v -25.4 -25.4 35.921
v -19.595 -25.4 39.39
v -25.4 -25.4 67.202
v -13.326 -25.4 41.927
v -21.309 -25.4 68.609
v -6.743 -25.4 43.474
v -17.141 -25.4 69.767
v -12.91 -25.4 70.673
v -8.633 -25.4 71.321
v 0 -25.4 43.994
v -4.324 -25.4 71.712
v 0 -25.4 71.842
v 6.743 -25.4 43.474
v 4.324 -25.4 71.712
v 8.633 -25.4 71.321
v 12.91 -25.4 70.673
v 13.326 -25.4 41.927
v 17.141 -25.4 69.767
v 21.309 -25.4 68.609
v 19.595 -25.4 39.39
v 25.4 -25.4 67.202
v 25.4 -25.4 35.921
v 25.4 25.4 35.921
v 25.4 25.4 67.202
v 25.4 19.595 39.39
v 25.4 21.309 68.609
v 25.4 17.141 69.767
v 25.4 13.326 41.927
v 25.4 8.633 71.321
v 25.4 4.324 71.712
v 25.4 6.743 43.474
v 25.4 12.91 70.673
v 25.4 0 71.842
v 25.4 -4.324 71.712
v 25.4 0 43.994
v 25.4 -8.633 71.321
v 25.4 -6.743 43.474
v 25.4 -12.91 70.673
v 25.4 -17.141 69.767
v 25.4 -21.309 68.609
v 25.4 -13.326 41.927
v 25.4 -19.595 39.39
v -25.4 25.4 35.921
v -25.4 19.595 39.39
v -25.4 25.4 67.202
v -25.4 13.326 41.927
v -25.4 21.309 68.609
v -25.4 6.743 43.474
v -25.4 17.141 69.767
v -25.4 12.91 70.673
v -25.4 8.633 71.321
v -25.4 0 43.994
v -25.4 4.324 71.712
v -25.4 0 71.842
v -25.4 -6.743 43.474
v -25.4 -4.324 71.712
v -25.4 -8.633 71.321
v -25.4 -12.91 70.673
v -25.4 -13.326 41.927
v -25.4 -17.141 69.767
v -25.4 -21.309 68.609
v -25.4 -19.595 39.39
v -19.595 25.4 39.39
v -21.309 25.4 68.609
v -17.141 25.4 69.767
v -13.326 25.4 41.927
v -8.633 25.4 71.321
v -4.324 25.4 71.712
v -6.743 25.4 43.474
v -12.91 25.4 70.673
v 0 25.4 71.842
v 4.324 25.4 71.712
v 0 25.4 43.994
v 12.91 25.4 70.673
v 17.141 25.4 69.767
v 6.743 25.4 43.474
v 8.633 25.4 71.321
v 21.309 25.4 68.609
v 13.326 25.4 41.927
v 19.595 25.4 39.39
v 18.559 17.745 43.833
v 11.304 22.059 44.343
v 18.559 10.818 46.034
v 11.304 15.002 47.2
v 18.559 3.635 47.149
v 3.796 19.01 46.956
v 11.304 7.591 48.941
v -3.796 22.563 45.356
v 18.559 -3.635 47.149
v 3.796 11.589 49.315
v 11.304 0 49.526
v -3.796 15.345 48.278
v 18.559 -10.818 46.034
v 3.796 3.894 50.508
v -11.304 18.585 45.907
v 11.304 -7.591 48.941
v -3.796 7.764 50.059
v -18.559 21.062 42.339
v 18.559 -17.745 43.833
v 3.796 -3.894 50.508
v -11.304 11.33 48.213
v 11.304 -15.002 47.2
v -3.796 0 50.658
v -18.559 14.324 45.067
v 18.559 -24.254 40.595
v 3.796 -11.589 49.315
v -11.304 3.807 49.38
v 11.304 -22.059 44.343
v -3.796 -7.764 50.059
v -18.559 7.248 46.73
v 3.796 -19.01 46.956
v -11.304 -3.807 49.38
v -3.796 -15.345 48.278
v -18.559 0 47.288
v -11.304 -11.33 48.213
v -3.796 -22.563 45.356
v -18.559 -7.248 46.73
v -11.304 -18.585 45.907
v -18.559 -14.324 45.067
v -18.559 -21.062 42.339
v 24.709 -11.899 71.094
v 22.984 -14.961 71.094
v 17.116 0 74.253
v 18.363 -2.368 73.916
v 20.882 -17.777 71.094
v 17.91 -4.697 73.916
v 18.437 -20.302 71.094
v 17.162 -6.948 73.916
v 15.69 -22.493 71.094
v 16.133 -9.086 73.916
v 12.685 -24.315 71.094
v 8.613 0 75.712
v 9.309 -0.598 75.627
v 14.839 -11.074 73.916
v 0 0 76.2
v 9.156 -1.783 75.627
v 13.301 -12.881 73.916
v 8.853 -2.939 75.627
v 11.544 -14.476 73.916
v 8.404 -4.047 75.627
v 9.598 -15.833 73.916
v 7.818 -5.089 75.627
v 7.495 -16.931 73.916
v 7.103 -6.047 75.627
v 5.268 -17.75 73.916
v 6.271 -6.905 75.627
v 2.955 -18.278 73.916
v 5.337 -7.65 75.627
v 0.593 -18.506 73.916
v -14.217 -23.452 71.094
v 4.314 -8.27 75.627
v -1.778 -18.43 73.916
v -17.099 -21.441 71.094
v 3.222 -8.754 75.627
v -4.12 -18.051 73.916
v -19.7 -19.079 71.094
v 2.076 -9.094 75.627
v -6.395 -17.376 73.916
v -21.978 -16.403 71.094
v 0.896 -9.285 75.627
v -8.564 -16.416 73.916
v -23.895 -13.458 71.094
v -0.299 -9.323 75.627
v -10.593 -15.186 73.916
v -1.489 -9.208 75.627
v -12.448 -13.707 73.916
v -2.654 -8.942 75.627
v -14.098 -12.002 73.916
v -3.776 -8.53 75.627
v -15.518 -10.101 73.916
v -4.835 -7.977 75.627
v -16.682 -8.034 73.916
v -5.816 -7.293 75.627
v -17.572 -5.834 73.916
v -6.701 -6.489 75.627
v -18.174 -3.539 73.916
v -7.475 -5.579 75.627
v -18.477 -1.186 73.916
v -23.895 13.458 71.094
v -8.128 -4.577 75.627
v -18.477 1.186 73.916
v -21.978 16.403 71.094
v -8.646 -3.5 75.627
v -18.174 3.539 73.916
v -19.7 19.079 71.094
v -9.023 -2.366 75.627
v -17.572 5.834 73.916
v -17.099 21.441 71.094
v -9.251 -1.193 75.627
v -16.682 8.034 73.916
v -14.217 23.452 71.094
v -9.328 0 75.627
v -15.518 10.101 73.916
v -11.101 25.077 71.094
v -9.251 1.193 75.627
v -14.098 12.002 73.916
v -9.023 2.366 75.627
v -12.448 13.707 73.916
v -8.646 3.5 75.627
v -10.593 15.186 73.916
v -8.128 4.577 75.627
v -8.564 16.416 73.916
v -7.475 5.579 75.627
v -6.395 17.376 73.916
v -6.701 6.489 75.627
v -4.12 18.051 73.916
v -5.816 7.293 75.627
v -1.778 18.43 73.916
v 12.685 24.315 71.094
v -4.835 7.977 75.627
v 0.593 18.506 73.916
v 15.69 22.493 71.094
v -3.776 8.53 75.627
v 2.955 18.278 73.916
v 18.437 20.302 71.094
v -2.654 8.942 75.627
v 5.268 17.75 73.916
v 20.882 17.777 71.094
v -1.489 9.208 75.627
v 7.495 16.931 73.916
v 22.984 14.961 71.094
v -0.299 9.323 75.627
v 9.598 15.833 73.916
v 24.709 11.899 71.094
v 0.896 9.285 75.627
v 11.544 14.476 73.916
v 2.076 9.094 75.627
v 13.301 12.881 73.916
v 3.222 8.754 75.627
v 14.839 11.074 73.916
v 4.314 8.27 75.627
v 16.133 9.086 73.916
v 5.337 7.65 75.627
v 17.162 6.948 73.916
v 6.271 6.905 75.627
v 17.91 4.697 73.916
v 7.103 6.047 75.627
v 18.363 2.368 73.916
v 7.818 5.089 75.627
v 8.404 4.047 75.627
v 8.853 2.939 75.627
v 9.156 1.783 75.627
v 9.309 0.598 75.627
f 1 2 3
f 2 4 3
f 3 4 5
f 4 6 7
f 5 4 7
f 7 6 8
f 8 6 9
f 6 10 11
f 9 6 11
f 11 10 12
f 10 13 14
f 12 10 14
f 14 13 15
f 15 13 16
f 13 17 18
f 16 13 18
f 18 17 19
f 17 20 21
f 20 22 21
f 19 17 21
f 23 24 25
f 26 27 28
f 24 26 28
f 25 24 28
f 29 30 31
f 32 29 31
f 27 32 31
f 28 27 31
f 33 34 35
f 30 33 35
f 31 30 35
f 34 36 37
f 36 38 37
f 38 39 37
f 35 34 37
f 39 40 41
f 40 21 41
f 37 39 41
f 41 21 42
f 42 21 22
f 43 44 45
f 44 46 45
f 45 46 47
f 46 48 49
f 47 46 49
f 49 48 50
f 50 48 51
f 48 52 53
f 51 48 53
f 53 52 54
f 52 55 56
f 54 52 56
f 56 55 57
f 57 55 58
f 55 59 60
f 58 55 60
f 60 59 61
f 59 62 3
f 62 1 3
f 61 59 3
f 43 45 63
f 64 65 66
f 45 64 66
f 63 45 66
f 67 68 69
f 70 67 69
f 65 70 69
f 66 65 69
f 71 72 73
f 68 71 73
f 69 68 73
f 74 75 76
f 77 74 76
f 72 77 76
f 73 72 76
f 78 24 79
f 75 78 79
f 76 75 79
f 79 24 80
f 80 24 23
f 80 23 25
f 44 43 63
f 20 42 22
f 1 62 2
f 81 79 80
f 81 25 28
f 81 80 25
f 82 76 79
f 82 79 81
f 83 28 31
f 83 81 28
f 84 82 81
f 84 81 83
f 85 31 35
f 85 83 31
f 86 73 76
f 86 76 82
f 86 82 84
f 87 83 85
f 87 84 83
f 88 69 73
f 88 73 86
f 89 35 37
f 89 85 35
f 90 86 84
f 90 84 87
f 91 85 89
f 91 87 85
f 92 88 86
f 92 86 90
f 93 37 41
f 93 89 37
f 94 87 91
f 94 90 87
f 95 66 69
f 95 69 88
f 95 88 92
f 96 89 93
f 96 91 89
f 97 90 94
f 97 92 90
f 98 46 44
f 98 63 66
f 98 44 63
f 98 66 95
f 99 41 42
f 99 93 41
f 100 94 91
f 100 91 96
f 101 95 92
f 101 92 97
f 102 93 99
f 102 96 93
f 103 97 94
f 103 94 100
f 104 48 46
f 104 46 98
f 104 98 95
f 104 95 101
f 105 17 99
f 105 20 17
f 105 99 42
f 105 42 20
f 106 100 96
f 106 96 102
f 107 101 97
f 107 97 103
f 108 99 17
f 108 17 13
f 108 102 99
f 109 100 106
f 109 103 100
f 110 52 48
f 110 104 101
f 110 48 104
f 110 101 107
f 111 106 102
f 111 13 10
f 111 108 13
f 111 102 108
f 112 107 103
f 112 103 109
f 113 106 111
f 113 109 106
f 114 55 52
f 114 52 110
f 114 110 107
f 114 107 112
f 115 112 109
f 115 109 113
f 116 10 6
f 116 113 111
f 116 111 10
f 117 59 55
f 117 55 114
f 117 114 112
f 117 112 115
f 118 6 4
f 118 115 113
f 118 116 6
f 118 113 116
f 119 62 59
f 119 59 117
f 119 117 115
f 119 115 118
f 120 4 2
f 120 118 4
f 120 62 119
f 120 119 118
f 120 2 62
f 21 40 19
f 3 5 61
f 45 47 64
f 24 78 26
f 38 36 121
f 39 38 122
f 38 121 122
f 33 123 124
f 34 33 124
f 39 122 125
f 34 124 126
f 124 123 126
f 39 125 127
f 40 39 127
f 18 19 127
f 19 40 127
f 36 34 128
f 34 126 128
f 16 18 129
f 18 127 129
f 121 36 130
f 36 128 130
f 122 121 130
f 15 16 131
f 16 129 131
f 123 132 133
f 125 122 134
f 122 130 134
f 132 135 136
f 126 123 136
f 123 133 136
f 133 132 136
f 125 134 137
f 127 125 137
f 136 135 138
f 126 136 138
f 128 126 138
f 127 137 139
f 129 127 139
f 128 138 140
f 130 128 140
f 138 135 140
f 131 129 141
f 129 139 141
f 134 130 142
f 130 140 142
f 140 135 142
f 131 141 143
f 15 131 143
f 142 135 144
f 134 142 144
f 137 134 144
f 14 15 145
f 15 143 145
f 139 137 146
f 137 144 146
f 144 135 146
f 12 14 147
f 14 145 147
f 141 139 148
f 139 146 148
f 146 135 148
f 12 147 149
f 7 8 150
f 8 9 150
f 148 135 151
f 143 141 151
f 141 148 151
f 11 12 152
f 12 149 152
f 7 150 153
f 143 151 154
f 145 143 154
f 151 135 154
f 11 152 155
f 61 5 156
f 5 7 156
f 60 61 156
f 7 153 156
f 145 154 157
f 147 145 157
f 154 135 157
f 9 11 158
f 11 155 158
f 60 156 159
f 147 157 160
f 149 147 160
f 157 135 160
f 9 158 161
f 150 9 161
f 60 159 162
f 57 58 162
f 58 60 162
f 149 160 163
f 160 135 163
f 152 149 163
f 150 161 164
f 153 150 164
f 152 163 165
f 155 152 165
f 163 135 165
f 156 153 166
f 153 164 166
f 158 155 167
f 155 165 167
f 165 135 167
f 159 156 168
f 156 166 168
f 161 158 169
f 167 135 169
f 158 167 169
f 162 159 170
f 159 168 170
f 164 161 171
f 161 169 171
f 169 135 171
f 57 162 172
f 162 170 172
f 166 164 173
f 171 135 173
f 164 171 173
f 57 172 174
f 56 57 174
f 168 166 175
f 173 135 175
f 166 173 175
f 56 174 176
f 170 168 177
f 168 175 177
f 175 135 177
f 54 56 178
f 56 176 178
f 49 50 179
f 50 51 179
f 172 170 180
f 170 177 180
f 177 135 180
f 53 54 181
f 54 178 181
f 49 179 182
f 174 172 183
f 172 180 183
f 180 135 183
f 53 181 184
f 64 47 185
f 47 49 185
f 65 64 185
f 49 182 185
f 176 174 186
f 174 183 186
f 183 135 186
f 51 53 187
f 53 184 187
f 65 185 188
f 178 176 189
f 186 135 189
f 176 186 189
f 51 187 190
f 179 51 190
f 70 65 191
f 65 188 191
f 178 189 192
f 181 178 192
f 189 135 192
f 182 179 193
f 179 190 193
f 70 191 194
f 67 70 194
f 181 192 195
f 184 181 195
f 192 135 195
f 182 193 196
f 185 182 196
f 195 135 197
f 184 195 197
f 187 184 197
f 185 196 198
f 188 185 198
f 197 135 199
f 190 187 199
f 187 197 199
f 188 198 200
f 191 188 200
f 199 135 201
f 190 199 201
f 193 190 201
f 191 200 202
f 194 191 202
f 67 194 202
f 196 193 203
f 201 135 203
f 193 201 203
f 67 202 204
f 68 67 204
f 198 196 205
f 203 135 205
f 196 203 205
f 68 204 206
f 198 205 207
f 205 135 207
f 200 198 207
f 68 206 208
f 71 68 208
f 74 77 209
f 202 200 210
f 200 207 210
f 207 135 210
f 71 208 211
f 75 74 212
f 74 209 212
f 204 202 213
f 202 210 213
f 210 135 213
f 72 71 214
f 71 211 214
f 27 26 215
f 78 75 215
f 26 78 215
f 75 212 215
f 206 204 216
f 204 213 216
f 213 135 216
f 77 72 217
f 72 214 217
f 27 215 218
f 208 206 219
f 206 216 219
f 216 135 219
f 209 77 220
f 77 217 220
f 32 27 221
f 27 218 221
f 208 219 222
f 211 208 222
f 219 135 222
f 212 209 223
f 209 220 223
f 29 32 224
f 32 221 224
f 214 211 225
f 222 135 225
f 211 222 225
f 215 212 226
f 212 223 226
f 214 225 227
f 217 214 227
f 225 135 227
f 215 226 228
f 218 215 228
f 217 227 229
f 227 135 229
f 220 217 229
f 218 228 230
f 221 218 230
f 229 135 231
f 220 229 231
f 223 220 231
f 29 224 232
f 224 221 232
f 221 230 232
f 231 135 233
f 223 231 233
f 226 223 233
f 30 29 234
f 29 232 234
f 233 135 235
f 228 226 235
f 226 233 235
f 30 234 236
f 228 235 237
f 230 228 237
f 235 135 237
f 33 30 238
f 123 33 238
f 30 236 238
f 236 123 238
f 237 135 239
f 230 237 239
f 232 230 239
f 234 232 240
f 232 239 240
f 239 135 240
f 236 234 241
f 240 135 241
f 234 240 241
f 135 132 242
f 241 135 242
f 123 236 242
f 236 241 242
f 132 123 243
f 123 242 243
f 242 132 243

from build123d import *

# Parameters (mm, degrees)
F4_DEPTH = 127
F3_W     = 50.8
F3_H     = 50.8
F5_DEPTH = 127


with BuildPart() as f1:
    # F0 (on Front) → F1 (revolve)
    with BuildSketch(Plane.XZ):
        with BuildLine():
            Line((0, 0), (0, -76.2))
            ThreePointArc((0, -76.2), (76.2, 0), (0, 76.2))
            Line((0, 76.2), (0, 0))
        make_face()
    revolve(axis=Axis((0, 0, 0), (0, 0, -1)))

    # F2 (on Front) → F4 (cut, symmetric)
    with BuildSketch(Plane.XZ):
        with BuildLine():
            Line((-25.4, 25.4), (-25.4, 71.8420489686))
            ThreePointArc((-25.4, 71.8420489686), (-53.8815367264, 53.8815367264), (-71.8420489686, 25.4))
            Line((-71.8420489686, 25.4), (-25.4, 25.4))
        make_face()
        with BuildLine():
            Line((-25.4, -25.4), (-25.4, 25.4))
            Line((-25.4, 25.4), (-71.8420489686, 25.4))
            ThreePointArc((-71.8420489686, 25.4), (-76.2, 0), (-71.8420489686, -25.4))
            Line((-71.8420489686, -25.4), (-25.4, -25.4))
        make_face()
        with BuildLine():
            ThreePointArc((-71.8420489686, -25.4), (-53.8815367264, -53.8815367264), (-25.4, -71.8420489686))
            Line((-25.4, -71.8420489686), (-25.4, -25.4))
            Line((-25.4, -25.4), (-71.8420489686, -25.4))
        make_face()
        with BuildLine():
            ThreePointArc((-25.4, -71.8420489686), (0, -76.2), (25.4, -71.8420489686))
            Line((25.4, -71.8420489686), (25.4, -25.4))
            Line((25.4, -25.4), (-25.4, -25.4))
            Line((-25.4, -25.4), (-25.4, -71.8420489686))
        make_face()
        with BuildLine():
            ThreePointArc((25.4, -71.8420489686), (53.8815367264, -53.8815367264), (71.8420489686, -25.4))
            Line((71.8420489686, -25.4), (25.4, -25.4))
            Line((25.4, -25.4), (25.4, -71.8420489686))
        make_face()
        with BuildLine():
            ThreePointArc((71.8420489686, -25.4), (75.1026102456, -12.8855707789), (76.2, 0))
            ThreePointArc((76.2, 0), (75.1026102456, 12.8855707789), (71.8420489686, 25.4))
            Line((71.8420489686, 25.4), (25.4, 25.4))
            Line((25.4, 25.4), (25.4, -25.4))
            Line((25.4, -25.4), (71.8420489686, -25.4))
        make_face()
        with BuildLine():
            Line((25.4, 25.4), (71.8420489686, 25.4))
            ThreePointArc((71.8420489686, 25.4), (53.8815367264, 53.8815367264), (25.4, 71.8420489686))
            Line((25.4, 71.8420489686), (25.4, 25.4))
        make_face()
    extrude(amount=F4_DEPTH, both=True, mode=Mode.SUBTRACT)

    # F3 (on Right) → F5 (cut, symmetric)
    with BuildSketch(Plane.YZ):
        with BuildLine():
            ThreePointArc((71.8420489686, -25.4), (75.1026102456, -12.8855707789), (76.2, 0))
            ThreePointArc((76.2, 0), (75.1026102456, 12.8855707789), (71.8420489686, 25.4))
            Line((71.8420489686, 25.4), (25.4, 25.4))
            Line((25.4, 25.4), (25.4, -25.4))
            Line((25.4, -25.4), (71.8420489686, -25.4))
        make_face()
        with BuildLine():
            Line((25.4, 25.4), (71.8420489686, 25.4))
            ThreePointArc((71.8420489686, 25.4), (53.8815367264, 53.8815367264), (25.4, 71.8420489686))
            Line((25.4, 71.8420489686), (25.4, 25.4))
        make_face()
        Rectangle(F3_W, F3_H)
        with BuildLine():
            ThreePointArc((-25.4, -71.8420489686), (0, -76.2), (25.4, -71.8420489686))
            Line((25.4, -71.8420489686), (25.4, -25.4))
            Line((25.4, -25.4), (-25.4, -25.4))
            Line((-25.4, -25.4), (-25.4, -71.8420489686))
        make_face()
        with BuildLine():
            Line((-25.4, 25.4), (-25.4, 71.8420489686))
            ThreePointArc((-25.4, 71.8420489686), (-53.8815367264, 53.8815367264), (-71.8420489686, 25.4))
            Line((-71.8420489686, 25.4), (-25.4, 25.4))
        make_face()
        with BuildLine():
            Line((-25.4, -25.4), (-25.4, 25.4))
            Line((-25.4, 25.4), (-71.8420489686, 25.4))
            ThreePointArc((-71.8420489686, 25.4), (-76.2, 0), (-71.8420489686, -25.4))
            Line((-71.8420489686, -25.4), (-25.4, -25.4))
        make_face()
    extrude(amount=F5_DEPTH, both=True, mode=Mode.SUBTRACT)

    # F6 (on Front) → F7 (revolve, cut)
    with BuildSketch(Plane.XZ):
        with BuildLine():
            Line((0, 0), (50.8, 0))
            ThreePointArc((50.8, 0), (0, 50.8), (-50.8, 0))
            Line((-50.8, 0), (0, 0))
        make_face()
    revolve(axis=Axis((25.4, 0, 0), (1, 0, 0)), mode=Mode.SUBTRACT)


solid = f1.part
